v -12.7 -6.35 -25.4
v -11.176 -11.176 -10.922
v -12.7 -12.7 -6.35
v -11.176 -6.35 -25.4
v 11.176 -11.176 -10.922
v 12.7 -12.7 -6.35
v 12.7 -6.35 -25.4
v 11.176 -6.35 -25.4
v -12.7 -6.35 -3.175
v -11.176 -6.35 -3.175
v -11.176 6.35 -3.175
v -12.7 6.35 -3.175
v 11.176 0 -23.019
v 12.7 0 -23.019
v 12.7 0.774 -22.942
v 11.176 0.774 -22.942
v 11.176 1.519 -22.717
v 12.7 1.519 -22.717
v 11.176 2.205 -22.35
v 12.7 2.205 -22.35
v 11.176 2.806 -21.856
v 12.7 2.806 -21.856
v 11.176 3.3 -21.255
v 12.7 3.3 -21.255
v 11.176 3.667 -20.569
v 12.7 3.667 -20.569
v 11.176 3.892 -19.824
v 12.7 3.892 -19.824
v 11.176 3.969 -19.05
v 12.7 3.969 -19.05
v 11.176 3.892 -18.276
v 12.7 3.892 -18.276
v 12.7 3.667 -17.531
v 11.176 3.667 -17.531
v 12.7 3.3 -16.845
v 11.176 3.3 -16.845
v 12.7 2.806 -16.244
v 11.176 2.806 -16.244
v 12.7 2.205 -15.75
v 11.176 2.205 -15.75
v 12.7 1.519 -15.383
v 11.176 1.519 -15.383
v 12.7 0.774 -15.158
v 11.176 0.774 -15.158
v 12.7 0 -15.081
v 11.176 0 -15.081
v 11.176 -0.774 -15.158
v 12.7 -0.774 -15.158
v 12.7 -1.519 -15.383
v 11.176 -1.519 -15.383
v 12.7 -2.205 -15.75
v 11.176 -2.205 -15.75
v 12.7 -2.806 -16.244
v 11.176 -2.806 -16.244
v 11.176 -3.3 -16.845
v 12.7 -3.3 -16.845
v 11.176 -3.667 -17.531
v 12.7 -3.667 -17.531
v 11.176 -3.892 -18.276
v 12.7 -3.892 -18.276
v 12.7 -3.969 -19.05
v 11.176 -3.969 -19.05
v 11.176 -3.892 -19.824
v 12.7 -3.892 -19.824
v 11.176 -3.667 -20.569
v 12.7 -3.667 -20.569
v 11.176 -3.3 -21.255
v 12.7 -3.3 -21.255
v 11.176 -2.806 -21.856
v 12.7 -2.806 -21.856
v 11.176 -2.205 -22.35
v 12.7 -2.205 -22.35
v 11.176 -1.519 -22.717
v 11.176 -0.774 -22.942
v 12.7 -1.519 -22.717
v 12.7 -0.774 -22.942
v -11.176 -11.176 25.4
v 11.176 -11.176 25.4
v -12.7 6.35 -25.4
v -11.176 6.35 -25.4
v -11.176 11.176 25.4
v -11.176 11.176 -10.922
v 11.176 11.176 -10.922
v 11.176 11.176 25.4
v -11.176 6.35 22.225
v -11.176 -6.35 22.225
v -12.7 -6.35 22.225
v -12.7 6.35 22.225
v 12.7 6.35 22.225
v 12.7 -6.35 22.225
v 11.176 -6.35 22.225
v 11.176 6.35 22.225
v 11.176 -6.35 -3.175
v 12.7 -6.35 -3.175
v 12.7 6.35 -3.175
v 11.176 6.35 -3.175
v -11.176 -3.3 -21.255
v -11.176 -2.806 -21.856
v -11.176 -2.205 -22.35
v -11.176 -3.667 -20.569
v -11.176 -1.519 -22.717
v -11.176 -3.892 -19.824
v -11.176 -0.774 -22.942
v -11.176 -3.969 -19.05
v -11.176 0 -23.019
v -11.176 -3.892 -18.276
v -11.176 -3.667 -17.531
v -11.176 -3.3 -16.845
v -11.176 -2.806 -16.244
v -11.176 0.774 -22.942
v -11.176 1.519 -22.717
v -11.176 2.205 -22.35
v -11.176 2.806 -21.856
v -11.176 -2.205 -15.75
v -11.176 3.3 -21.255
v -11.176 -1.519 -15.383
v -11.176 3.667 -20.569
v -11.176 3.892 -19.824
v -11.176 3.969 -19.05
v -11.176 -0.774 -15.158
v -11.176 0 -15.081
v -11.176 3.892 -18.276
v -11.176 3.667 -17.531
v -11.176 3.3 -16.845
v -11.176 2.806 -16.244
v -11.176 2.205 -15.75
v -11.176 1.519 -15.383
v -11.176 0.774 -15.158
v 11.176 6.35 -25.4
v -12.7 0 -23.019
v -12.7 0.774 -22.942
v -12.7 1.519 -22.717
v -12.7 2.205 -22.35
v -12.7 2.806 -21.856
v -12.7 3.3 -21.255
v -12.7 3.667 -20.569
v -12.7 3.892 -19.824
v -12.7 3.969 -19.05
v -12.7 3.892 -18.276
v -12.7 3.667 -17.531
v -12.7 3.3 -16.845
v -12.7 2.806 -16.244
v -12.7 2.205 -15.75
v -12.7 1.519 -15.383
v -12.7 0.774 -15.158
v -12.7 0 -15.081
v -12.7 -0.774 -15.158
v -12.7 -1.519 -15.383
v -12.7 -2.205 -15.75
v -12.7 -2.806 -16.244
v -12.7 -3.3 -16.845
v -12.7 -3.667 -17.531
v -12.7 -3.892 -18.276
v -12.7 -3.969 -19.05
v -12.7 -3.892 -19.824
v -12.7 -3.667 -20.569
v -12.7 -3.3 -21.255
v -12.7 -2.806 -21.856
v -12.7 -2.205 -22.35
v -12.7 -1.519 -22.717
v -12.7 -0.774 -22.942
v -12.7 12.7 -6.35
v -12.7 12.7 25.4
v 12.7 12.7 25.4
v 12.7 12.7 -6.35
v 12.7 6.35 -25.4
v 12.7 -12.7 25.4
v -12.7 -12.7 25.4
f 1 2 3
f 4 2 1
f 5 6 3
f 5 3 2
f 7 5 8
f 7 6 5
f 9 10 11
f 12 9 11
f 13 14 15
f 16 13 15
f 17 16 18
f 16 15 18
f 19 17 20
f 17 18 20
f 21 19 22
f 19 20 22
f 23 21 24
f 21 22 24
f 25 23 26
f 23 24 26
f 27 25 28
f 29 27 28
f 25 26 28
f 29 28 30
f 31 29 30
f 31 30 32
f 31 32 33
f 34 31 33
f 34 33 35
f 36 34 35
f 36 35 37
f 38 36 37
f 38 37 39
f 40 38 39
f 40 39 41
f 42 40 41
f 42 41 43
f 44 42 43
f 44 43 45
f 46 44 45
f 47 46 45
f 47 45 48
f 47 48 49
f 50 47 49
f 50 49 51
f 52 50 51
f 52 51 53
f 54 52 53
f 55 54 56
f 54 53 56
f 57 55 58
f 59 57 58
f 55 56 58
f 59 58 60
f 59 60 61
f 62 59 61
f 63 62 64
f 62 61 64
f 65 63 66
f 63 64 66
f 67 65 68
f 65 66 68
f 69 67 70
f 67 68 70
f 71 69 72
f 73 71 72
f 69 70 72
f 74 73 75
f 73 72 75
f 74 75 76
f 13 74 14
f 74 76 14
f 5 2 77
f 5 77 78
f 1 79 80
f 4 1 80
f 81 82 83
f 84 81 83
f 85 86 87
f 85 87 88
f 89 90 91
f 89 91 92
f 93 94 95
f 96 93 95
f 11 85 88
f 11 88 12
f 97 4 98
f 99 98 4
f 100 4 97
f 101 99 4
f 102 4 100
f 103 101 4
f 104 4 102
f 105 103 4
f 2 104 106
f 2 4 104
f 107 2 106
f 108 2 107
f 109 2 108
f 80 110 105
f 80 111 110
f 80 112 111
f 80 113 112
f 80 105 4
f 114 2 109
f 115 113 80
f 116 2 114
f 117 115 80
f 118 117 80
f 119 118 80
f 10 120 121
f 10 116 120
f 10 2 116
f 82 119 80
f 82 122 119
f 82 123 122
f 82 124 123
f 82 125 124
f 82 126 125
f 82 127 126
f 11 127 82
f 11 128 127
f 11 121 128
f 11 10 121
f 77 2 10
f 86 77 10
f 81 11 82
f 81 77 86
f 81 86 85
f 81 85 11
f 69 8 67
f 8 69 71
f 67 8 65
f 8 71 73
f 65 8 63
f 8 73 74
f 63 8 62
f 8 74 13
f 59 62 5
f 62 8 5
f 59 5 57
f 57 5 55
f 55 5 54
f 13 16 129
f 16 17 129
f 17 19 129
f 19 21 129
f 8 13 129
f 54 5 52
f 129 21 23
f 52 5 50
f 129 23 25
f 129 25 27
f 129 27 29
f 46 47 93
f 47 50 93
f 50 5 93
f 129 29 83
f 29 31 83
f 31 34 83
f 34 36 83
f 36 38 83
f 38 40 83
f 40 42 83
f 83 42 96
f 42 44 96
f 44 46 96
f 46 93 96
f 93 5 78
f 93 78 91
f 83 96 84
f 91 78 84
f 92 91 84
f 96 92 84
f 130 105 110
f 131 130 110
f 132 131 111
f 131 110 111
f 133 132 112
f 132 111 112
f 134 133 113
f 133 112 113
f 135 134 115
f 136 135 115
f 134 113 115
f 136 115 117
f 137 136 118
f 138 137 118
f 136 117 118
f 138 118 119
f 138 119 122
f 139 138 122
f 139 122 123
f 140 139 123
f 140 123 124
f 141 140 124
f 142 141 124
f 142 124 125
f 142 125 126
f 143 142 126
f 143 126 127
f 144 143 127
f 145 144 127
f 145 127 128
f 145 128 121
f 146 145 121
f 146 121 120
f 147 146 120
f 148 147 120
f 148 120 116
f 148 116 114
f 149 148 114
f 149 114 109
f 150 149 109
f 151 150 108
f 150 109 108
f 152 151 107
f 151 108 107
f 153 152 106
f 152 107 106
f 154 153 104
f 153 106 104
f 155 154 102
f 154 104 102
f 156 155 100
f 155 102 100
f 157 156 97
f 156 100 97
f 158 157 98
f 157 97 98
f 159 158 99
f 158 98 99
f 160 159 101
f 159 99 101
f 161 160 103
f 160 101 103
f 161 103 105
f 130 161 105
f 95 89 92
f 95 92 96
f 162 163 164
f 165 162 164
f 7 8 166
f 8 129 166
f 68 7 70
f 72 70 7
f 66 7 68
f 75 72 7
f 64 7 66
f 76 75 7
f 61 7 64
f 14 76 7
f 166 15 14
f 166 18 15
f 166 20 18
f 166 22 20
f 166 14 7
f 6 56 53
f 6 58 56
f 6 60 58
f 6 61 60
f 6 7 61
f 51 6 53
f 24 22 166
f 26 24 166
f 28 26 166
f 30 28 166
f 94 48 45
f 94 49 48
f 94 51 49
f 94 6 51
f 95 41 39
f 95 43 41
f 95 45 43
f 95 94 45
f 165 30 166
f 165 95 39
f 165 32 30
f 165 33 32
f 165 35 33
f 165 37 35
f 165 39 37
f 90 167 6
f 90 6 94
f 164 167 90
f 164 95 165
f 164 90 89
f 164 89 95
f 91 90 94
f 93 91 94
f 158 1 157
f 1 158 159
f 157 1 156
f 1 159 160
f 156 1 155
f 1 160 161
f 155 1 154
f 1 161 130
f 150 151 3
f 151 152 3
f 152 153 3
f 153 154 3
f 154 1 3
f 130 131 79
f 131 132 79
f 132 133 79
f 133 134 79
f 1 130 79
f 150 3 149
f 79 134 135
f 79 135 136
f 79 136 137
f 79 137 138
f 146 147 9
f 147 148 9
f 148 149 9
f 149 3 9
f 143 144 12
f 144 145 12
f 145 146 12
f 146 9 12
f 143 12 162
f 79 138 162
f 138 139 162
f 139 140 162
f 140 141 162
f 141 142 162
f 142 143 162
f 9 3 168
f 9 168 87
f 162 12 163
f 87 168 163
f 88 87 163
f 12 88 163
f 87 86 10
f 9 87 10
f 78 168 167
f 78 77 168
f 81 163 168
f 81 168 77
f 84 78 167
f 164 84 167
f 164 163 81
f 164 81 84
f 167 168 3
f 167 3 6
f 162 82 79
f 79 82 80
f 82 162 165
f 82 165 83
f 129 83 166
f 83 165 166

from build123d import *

# Parameters (mm, degrees)
SKETCH1_W           = 25.4
SKETCH1_H           = 25.4
SKETCH1_W_2         = 22.352
SKETCH1_H_2         = 22.352
BOSS_EXTRUDE1_DEPTH = 25.4
SKETCH2_R           = 3.96875
SKETCH2_W           = 25.4
SKETCH2_H           = 12.7
CUT_EXTRUDE1_DEPTH  = 26.4
CUT_EXTRUDE2_DEPTH  = 26.4


with BuildPart() as part:
    # Sketch1 → Boss-Extrude1 (new body, symmetric)
    with BuildSketch(Plane.XY):
        Rectangle(SKETCH1_W, SKETCH1_H)
        Rectangle(SKETCH1_W_2, SKETCH1_H_2, mode=Mode.SUBTRACT)
    extrude(amount=BOSS_EXTRUDE1_DEPTH, both=True)

    # Sketch2 → Cut-Extrude1 (cut, through all)
    with BuildSketch(Plane(origin=(12.7, 0, 0), x_dir=(0, 0, -1), z_dir=(1, 0, 0))):
        with Locations((19.05, 0)):
            Circle(SKETCH2_R)
        with Locations((-9.525, 0)):
            Rectangle(SKETCH2_W, SKETCH2_H)
    extrude(amount=-CUT_EXTRUDE1_DEPTH, mode=Mode.SUBTRACT)

    # Sketch3 → Cut-Extrude2 (cut, through all)
    with BuildSketch(Plane(origin=(12.7, 0, 0), x_dir=(0, 0, -1), z_dir=(1, 0, 0))):
        Polygon((6.35, 12.7), (25.4, 6.35), (25.4, 12.7), align=None)
        Polygon((25.4, -6.35), (25.4, -12.7), (6.35, -12.7), align=None)
    extrude(amount=-CUT_EXTRUDE2_DEPTH, mode=Mode.SUBTRACT)


solid = part.part
